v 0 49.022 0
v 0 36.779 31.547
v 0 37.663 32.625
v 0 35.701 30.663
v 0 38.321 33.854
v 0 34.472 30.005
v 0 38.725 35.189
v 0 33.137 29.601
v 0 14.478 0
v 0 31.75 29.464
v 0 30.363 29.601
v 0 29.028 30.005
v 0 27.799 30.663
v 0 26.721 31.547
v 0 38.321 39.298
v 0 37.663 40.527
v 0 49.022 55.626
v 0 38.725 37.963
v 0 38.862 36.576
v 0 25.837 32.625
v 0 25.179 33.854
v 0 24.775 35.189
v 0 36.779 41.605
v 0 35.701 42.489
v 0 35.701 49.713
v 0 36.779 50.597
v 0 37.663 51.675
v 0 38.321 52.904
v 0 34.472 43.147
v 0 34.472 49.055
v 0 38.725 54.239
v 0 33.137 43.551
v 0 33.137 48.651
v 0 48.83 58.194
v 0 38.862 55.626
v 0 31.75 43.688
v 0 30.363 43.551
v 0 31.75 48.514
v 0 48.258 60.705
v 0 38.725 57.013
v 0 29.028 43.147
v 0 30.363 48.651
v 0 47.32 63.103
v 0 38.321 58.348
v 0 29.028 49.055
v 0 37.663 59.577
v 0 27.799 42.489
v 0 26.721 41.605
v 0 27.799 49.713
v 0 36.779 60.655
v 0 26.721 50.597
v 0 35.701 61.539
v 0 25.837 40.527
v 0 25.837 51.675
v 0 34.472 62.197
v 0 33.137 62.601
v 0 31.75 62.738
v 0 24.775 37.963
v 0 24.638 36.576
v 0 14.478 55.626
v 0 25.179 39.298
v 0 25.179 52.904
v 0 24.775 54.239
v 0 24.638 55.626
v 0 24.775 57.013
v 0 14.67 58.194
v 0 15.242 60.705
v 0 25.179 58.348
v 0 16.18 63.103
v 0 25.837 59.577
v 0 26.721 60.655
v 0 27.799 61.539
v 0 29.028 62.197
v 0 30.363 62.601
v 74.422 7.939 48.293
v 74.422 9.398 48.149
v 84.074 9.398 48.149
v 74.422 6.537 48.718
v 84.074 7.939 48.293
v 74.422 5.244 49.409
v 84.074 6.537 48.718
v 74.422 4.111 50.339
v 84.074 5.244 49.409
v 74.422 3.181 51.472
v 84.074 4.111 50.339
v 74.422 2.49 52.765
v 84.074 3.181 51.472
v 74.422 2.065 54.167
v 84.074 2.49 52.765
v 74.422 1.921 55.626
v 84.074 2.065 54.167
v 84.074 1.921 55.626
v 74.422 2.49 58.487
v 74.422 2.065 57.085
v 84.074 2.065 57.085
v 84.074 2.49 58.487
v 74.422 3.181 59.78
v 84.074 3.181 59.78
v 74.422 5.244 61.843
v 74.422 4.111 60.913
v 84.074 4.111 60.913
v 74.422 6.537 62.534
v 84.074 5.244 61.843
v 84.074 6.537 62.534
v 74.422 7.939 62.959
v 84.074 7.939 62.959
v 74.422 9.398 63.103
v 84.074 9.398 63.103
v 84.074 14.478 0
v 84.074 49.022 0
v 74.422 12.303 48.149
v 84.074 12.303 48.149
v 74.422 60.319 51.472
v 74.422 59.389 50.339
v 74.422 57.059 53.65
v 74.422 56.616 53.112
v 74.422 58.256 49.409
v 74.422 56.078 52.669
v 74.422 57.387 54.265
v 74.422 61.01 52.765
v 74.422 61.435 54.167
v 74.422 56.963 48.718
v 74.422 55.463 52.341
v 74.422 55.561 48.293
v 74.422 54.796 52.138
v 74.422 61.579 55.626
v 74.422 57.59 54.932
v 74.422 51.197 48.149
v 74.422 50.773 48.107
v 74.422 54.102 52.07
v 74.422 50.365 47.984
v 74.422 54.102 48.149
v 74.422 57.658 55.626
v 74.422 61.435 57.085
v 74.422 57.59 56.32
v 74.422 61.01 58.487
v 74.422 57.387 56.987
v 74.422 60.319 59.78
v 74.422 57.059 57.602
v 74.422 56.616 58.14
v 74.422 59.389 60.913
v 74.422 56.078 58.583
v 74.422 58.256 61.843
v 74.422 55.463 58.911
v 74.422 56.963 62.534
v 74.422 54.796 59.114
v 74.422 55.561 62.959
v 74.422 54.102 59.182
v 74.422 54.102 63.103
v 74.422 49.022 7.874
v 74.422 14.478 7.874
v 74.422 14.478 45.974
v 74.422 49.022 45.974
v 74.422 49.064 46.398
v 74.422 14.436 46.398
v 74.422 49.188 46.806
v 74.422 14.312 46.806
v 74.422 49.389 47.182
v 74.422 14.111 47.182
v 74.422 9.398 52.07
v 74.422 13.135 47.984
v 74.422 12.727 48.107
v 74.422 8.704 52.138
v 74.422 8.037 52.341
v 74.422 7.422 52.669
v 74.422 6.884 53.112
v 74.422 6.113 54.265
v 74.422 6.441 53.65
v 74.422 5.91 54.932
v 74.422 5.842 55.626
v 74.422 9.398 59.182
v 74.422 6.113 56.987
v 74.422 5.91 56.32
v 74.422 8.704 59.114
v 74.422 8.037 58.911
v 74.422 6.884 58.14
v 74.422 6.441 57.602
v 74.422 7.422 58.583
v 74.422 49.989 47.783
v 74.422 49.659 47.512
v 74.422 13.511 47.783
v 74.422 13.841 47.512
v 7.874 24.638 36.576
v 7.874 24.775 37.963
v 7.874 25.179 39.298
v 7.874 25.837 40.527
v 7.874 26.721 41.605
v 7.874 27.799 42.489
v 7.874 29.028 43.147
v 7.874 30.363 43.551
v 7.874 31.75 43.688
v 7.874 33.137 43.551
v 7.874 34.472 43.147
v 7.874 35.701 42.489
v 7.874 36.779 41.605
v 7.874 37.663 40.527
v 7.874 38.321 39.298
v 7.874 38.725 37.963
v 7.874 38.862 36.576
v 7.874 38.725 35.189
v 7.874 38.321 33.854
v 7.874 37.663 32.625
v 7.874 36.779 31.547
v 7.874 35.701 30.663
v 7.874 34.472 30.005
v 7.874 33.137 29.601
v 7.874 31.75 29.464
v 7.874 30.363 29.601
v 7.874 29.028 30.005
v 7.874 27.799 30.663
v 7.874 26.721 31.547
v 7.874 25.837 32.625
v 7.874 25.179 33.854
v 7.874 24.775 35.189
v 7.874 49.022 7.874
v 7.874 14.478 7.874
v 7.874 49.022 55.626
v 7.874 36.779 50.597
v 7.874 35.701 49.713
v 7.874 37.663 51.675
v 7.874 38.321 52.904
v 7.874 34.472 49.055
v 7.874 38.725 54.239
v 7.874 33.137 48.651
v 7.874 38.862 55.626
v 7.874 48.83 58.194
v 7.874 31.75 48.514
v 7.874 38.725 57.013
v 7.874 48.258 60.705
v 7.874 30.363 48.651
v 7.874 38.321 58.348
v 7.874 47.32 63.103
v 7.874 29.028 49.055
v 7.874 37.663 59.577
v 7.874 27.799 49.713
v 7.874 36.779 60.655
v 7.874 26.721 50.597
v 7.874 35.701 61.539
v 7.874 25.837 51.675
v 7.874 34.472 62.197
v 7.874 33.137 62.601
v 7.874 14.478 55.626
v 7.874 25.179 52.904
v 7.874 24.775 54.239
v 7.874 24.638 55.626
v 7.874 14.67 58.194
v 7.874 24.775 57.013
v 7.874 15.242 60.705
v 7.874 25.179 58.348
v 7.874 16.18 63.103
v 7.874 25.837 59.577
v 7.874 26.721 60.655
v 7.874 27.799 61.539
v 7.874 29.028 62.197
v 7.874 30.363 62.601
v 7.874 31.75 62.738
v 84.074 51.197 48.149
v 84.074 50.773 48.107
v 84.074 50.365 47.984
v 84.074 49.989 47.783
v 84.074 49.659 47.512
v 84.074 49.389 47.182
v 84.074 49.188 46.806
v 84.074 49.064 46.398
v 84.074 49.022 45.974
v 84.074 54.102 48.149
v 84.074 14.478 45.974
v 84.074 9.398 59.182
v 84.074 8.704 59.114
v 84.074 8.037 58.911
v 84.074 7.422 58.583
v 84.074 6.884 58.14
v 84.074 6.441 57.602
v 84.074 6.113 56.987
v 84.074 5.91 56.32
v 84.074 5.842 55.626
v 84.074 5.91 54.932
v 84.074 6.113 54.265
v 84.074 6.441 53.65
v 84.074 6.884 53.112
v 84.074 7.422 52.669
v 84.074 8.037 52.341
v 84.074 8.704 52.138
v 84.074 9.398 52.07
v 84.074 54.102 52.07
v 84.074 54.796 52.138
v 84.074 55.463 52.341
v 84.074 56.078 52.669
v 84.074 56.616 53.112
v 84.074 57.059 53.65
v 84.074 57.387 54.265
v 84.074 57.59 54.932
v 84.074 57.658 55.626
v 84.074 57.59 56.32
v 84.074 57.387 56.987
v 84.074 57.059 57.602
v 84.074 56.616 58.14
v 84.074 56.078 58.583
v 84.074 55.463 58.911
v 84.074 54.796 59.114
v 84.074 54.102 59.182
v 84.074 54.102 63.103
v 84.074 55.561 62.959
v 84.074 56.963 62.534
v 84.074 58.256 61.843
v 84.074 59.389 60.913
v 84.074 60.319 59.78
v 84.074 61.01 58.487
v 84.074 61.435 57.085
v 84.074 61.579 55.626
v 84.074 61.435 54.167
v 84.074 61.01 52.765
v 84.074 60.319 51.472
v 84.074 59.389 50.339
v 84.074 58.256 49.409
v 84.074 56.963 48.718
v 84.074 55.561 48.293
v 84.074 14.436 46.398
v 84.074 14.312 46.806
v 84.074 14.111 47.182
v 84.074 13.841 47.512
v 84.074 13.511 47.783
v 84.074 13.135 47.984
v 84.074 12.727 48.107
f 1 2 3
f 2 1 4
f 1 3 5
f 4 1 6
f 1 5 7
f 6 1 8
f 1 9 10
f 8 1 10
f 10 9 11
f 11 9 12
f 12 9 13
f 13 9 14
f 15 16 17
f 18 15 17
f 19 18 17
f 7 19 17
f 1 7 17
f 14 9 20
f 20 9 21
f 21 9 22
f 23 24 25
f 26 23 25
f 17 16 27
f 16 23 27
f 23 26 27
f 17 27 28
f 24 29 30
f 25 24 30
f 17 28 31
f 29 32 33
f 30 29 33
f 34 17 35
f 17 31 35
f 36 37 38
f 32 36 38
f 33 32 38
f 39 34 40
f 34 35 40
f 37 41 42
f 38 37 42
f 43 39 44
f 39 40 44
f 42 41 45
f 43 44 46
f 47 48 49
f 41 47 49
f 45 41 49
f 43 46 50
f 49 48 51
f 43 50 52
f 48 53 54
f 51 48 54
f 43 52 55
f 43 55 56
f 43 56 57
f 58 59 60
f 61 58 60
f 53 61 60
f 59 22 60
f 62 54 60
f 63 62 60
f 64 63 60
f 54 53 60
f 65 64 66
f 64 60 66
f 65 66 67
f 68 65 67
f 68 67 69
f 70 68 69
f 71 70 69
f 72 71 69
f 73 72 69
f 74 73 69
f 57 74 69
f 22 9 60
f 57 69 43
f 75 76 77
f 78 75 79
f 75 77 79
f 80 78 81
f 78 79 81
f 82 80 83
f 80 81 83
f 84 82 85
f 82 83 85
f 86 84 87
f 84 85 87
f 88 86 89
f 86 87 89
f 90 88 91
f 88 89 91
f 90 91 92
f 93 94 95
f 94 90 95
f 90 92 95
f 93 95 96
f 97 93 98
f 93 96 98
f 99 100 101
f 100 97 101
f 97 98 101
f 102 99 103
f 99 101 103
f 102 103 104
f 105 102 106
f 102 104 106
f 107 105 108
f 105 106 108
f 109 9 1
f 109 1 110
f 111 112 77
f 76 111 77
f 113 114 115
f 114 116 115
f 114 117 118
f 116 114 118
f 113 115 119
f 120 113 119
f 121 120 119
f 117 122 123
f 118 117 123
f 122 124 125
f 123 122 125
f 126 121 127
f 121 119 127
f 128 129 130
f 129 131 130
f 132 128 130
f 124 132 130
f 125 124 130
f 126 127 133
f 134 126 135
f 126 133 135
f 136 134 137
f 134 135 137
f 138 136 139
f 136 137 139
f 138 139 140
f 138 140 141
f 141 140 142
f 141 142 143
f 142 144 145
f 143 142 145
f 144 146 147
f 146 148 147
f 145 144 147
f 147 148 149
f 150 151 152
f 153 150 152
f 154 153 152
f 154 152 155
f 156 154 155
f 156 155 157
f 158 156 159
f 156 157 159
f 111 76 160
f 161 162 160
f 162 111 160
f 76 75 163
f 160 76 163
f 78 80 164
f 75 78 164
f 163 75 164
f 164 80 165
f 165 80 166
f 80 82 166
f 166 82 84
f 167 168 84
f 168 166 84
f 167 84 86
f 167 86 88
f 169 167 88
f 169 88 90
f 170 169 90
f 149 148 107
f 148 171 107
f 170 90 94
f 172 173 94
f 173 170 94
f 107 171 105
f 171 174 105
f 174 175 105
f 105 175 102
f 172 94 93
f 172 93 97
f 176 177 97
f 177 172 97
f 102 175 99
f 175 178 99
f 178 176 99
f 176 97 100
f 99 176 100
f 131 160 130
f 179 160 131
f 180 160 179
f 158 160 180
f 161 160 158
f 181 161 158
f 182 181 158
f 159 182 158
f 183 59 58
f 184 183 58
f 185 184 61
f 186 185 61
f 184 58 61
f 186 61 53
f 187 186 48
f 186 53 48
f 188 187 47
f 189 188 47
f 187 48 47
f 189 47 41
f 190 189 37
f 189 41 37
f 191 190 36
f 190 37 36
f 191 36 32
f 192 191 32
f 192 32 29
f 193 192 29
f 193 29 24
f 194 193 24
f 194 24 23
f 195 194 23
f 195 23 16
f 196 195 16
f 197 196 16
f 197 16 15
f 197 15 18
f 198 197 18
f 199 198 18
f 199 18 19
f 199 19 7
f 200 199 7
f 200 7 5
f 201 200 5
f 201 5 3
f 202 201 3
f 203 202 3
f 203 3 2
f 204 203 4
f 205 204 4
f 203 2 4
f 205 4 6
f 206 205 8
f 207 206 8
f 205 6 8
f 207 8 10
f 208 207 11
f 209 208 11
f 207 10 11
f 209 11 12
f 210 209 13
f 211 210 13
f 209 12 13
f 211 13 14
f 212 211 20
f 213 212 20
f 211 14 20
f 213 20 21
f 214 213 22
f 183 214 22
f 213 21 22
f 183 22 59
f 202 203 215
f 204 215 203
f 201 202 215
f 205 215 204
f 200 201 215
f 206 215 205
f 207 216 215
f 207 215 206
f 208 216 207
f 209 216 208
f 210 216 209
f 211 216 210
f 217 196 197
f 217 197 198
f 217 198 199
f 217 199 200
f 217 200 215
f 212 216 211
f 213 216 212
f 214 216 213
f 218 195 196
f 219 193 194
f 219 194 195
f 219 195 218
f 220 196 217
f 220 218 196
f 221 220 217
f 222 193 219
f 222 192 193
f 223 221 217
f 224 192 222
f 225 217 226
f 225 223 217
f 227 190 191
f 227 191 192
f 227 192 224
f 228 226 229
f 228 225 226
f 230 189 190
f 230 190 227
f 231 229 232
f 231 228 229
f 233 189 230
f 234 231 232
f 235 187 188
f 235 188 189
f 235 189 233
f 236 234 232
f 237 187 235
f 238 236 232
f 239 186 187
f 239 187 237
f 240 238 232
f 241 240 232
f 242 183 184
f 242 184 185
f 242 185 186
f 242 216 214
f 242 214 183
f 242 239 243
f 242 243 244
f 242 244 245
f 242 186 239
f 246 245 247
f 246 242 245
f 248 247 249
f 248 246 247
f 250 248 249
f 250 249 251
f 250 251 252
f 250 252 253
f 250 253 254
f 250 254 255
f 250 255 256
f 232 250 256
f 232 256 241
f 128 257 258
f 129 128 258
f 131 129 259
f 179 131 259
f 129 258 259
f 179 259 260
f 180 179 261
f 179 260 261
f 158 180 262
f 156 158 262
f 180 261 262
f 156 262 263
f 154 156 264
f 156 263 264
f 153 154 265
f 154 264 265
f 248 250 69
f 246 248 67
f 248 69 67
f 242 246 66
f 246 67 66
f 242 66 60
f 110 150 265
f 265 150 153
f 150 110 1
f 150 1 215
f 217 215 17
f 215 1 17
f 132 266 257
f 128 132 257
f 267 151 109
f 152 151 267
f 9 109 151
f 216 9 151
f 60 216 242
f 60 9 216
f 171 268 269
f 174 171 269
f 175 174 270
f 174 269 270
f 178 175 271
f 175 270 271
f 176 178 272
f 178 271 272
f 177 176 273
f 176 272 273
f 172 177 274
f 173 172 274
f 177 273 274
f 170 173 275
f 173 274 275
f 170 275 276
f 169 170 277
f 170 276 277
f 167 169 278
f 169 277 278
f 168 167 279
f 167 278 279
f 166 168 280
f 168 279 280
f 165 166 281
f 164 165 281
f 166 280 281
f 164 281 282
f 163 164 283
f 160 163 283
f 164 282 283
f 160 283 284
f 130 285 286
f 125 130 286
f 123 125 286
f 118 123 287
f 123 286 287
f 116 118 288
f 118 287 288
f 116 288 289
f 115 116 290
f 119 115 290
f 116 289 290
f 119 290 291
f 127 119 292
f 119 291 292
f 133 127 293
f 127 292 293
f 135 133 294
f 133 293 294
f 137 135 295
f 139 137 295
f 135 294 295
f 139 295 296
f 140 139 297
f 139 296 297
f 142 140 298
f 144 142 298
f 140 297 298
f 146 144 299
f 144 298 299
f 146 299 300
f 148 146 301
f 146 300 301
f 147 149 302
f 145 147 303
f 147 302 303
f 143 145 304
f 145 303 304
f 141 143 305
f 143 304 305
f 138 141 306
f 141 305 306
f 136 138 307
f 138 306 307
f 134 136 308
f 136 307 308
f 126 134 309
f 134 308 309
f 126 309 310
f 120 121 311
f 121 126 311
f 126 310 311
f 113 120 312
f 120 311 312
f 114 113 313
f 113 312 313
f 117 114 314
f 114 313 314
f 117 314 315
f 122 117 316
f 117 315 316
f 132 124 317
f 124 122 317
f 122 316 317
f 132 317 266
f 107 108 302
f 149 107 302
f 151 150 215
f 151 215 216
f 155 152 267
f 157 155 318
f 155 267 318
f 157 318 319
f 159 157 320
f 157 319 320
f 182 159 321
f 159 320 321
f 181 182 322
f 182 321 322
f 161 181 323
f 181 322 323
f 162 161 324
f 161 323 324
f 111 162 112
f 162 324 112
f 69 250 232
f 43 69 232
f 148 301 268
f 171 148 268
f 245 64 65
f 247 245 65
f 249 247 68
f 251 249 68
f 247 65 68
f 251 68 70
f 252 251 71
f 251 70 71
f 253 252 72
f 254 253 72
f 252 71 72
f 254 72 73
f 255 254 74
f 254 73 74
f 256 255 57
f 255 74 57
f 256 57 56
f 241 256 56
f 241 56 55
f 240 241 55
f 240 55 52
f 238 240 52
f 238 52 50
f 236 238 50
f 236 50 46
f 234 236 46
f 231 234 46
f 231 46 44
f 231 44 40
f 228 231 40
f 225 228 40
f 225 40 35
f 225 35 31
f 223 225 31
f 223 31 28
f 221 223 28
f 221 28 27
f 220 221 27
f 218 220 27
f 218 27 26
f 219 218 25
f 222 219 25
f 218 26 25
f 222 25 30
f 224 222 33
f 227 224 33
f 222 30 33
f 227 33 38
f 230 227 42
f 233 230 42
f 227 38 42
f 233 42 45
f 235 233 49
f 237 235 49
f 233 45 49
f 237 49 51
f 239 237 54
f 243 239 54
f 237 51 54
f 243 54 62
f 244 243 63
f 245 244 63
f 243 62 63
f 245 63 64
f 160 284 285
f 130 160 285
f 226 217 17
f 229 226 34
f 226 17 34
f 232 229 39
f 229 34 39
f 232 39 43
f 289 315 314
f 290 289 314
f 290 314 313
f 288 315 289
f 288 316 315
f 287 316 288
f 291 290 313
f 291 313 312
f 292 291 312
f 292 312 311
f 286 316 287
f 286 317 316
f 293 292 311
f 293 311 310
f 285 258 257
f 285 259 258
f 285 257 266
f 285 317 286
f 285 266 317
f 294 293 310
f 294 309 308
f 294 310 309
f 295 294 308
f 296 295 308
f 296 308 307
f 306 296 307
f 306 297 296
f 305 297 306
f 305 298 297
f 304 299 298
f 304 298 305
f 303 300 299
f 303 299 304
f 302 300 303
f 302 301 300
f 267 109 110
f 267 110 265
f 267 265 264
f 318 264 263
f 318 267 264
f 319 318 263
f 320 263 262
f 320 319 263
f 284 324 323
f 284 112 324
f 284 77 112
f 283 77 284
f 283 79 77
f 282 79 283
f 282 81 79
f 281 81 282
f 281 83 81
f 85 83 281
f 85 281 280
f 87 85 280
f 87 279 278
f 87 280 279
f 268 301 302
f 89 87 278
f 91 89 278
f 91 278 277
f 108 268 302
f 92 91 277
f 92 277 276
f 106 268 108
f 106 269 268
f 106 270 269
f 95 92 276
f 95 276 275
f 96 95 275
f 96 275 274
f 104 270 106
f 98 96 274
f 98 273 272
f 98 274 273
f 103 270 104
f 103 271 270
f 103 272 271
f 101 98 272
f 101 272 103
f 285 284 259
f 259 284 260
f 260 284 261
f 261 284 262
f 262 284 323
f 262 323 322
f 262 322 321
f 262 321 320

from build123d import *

# Parameters (mm, degrees)
F0_W      = 84.074
F0_H      = 76.2
F1_DEPTH  = 63.5
F2_W      = 66.548
F2_H      = 68.326
F3_DEPTH  = 63.501
F5_DEPTH  = 25.4
F4_W      = 14.478
F4_H      = 7.874
F6_DEPTH  = 84.075
F4_R      = 7.112
F7_DEPTH  = 25.4
F9_DEPTH  = 84.075
F10_DEPTH = 25.4


with BuildPart() as f1:
    # F0 (on Front) → F1 (new body)
    with BuildSketch(Plane.XZ):
        with Locations((42.037, 38.1)):
            Rectangle(F0_W, F0_H)
    extrude(amount=-F1_DEPTH)

    # F2 (on face) → F3 (cut, through all)
    with BuildSketch(Plane.XZ):
        with Locations((41.148, 42.037)):
            Rectangle(F2_W, F2_H)
    extrude(amount=-F3_DEPTH, mode=Mode.SUBTRACT)

    # F4 (on face) → F5 (cut)
    with BuildSketch(Plane(origin=(0, 0, 0), x_dir=(0, -1, 0), z_dir=(-1, 0, 0))):
        with BuildLine():
            Line((-63.5, 7.874), (-49.022, 7.874))
            Line((-49.022, 7.874), (-49.022, 55.626))
            ThreePointArc((-49.022, 55.626), (-31.75, 72.898), (-14.478, 55.626))
            Line((-14.478, 55.626), (-14.478, 7.874))
            Line((-14.478, 7.874), (0, 7.874))
            Line((0, 7.874), (0, 76.2))
            Line((0, 76.2), (-63.5, 76.2))
            Line((-63.5, 76.2), (-63.5, 7.874))
        make_face()
    extrude(amount=-F5_DEPTH, mode=Mode.SUBTRACT)

    # F4 (on face) → F6 (cut, through all)
    with BuildSketch(Plane(origin=(0, 0, 0), x_dir=(0, -1, 0), z_dir=(-1, 0, 0))):
        with Locations((-56.261, 3.937)):
            Rectangle(F4_W, F4_H)
        with Locations((-7.239, 3.937)):
            Rectangle(F4_W, F4_H)
    extrude(amount=-F6_DEPTH, mode=Mode.SUBTRACT)

    # F4 (on face) → F7 (cut)
    with BuildSketch(Plane(origin=(0, 0, 0), x_dir=(0, -1, 0), z_dir=(-1, 0, 0))):
        with Locations((-31.75, 36.576)):
            Circle(F4_R)
        with Locations((-31.75, 55.626)):
            Circle(F4_R)
    extrude(amount=-F7_DEPTH, mode=Mode.SUBTRACT)

    # F8 (on face) → F9 (cut, through all)
    with BuildSketch(Plane.YZ.offset(84.074)):
        with BuildLine():
            Line((0, 7.874), (14.478, 7.874))
            Line((14.478, 7.874), (14.478, 45.974))
            ThreePointArc((14.478, 45.974), (13.840888, 47.512124), (12.302764, 48.149236))
            Line((12.302764, 48.149236), (9.398, 48.149236))
            ThreePointArc((9.398, 48.149236), (1.921236, 55.626), (9.398, 63.102764))
            Line((9.398, 63.102764), (31.75, 63.102764))
            Line((31.75, 63.102764), (54.102, 63.102764))
            ThreePointArc((54.102, 63.102764), (61.578764, 55.626), (54.102, 48.149236))
            Line((54.102, 48.149236), (51.197236, 48.149236))
            ThreePointArc((51.197236, 48.149236), (49.659112, 47.512124), (49.022, 45.974))
            Line((49.022, 45.974), (49.022, 7.874))
            Line((49.022, 7.874), (63.5, 7.874))
            Line((63.5, 7.874), (63.5, 76.2))
            Line((63.5, 76.2), (0, 76.2))
            Line((0, 76.2), (0, 7.874))
        make_face()
    extrude(amount=-F9_DEPTH, mode=Mode.SUBTRACT)

    # F8 (on face) → F10 (cut)
    with BuildSketch(Plane.YZ.offset(84.074)):
        with BuildLine():
            ThreePointArc((54.102, 52.07), (57.658, 55.626), (54.102, 59.182))
            Line((54.102, 59.182), (31.75, 59.182))
            Line((31.75, 59.182), (9.398, 59.182))
            ThreePointArc((9.398, 59.182), (5.842, 55.626), (9.398, 52.07))
            Line((9.398, 52.07), (31.75, 52.07))
            Line((31.75, 52.07), (54.102, 52.07))
        make_face()
    extrude(amount=-F10_DEPTH, mode=Mode.SUBTRACT)


solid = f1.part
